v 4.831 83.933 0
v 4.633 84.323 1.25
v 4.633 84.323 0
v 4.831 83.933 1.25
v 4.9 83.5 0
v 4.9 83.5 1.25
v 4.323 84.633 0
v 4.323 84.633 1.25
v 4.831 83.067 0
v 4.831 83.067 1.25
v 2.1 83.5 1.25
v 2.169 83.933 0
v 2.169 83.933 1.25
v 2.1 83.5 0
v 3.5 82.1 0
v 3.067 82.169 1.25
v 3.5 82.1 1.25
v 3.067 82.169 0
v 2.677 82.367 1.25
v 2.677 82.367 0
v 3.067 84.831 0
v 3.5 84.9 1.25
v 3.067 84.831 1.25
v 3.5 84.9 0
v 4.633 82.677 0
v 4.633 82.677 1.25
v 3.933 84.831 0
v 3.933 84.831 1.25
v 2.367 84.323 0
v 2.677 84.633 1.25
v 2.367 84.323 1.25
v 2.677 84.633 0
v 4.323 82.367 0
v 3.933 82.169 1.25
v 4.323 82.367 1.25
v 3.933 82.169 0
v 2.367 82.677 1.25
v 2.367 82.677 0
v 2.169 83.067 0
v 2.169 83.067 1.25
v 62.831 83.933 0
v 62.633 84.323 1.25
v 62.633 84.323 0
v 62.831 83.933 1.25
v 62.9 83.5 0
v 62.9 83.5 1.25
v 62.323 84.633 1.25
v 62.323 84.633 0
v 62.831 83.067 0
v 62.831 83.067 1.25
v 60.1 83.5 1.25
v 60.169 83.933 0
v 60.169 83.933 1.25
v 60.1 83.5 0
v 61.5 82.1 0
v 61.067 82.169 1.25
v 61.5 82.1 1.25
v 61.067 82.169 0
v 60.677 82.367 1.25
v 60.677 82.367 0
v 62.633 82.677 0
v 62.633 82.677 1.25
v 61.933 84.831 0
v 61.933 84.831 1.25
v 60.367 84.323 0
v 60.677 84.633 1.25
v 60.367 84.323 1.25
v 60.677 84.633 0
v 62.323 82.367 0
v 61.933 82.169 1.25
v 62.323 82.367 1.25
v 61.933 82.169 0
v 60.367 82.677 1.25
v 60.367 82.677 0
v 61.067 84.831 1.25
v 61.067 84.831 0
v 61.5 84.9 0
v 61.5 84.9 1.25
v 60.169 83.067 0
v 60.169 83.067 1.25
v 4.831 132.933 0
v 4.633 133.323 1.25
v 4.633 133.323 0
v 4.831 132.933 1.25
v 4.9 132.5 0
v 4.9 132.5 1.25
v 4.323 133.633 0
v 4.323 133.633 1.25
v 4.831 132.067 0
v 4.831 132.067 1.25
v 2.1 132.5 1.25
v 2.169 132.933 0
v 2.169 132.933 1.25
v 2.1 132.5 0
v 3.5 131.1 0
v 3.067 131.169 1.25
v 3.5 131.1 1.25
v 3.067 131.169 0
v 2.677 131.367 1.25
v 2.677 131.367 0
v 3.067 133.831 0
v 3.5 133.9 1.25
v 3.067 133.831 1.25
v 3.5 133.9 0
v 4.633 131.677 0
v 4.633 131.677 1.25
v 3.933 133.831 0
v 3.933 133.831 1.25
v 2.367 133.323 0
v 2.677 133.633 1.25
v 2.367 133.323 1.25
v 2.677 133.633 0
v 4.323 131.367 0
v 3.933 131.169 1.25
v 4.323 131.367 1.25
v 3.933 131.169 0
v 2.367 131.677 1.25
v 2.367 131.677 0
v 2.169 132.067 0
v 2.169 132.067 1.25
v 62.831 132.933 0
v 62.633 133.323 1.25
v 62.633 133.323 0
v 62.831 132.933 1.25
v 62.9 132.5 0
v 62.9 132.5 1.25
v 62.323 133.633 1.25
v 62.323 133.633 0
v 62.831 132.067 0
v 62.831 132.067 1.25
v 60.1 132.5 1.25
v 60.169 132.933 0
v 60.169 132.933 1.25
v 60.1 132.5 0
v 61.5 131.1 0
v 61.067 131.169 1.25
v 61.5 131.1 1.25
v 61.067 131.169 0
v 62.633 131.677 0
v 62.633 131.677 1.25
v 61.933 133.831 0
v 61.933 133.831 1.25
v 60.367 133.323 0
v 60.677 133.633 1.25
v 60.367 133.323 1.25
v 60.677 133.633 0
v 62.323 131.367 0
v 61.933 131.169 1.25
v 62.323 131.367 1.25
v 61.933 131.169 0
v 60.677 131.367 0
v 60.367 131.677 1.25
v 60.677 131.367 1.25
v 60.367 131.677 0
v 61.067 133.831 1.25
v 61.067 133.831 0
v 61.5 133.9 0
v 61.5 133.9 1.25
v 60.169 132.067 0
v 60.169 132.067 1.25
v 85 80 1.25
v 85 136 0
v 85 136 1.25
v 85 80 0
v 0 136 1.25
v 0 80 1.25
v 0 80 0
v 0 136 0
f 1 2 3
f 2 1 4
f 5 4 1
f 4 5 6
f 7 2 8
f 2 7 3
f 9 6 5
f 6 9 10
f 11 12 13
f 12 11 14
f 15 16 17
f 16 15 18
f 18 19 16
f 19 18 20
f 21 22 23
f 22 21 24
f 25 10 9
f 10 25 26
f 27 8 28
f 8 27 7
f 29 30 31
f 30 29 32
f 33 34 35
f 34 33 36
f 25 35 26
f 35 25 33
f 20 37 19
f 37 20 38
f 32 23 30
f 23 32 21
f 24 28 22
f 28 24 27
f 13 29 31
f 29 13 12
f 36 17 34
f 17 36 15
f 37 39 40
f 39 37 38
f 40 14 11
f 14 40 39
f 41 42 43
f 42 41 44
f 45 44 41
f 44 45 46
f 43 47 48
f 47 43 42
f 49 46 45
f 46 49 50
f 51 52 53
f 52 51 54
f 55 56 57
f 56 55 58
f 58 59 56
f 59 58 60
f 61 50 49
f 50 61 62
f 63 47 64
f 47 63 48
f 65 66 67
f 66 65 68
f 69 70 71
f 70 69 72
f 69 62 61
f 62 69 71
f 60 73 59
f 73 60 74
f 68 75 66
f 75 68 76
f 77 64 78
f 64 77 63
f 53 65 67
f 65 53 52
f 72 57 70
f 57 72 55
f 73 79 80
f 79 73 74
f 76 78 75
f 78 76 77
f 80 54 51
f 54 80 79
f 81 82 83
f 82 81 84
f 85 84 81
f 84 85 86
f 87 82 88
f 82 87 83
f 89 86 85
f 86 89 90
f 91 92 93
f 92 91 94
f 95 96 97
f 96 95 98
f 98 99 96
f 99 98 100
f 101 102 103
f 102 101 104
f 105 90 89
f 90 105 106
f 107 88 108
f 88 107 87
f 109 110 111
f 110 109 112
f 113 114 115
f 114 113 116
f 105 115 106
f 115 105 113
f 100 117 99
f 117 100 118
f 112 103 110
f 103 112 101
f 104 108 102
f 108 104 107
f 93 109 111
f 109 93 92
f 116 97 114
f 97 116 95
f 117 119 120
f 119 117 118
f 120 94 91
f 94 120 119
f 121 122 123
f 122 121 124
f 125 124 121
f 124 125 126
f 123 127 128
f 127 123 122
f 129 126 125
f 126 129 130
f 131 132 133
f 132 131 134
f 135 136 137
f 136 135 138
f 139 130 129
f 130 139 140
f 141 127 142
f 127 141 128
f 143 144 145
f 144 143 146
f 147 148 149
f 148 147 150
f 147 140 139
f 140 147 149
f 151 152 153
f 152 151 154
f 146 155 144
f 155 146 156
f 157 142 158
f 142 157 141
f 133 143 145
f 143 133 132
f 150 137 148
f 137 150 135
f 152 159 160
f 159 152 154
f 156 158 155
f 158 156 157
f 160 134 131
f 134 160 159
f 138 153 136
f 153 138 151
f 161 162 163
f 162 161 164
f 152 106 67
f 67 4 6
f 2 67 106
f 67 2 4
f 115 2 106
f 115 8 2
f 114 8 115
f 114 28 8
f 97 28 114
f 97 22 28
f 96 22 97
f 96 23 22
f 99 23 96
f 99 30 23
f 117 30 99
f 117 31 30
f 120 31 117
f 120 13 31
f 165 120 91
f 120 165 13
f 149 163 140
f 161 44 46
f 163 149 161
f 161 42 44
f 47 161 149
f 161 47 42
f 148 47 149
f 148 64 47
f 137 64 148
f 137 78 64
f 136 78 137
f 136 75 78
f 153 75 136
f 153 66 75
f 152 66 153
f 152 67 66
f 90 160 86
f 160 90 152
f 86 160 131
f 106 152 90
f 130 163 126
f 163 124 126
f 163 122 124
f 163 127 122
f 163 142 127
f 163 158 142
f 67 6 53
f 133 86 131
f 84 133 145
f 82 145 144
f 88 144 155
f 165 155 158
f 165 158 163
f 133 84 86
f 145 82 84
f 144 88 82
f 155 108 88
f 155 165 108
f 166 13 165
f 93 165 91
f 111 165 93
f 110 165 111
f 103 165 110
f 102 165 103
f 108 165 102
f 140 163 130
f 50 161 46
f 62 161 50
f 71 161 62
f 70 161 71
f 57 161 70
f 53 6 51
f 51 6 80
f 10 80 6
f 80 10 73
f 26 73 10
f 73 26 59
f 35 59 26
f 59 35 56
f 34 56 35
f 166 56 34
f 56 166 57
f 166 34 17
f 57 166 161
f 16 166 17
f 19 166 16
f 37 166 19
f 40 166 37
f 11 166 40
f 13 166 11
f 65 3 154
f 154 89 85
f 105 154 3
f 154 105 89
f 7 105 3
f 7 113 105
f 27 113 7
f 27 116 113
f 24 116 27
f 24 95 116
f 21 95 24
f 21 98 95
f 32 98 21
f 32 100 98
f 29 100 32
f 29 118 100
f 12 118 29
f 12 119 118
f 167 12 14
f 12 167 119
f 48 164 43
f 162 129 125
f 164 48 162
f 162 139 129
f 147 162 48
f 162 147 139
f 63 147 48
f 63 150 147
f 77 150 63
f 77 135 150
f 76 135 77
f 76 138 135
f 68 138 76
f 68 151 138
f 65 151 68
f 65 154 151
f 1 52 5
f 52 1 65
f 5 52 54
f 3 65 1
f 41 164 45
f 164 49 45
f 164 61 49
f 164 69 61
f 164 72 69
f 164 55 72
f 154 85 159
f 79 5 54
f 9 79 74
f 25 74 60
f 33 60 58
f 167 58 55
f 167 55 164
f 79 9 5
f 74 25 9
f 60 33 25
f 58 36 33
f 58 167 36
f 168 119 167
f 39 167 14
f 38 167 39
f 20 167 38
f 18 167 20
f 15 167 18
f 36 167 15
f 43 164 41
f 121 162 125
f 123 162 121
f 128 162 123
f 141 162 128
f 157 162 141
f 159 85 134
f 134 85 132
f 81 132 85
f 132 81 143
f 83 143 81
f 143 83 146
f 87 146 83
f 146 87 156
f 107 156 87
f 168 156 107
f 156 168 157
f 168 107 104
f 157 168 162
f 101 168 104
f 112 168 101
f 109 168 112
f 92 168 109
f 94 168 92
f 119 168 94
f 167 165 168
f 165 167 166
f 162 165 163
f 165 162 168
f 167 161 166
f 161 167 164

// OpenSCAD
//Shut your Pi Hole! 
//An OpenSCAD library to assist with designing Raspberry Pi accessories

//This work is licensed under the Creative Commons Attribution-ShareAlike 4.0 International License. To view a copy of this license, visit http://creativecommons.org/licenses/by-sa/4.0/.
//© 2016 Dale Price

//Pi dimensions sourced from https://www.raspberrypi.org/documentation/hardware/raspberrypi/mechanical/
//Currently supports "1B", "1A+", "1B+", "2B", "3B", "Zero"

//get vector of [x,y] vectors of locations of mounting holes based on Pi version
function piHoleLocations (board="3B") = 
	(board=="1A+" || board=="1B+" || board=="2B" || board=="3B") ?
		[[3.5, 3.5], [61.5, 3.5], [3.5, 52.5], [61.5, 52.5]] : //pi 1B+, 2B, 3B
	(board=="Zero") ?
		[[3.5, 3.5], [61.5, 3.5], [3.5, 26.5], [61.5, 26.5]] : //pi zero
	(board=="1B") ?
		[[80, 43.5], [25, 17.5]] :
	[]; //invalid board

//get vector of [x,y,z] dimensions of board
//	dimensions are for PCB only, not ports or anything else
function piBoardDim (board="3B") =
	(board=="1B" || board=="1B+" || board=="2B" || board=="3B") ?
		[85, 56, 1.25] :
	(board=="Zero") ?
		[65, 30, 1.25] :
	(board == "1A+") ?
		[65, 56, 1.25] :
	[0,0,0];

//Mounting holes for a Raspberry Pi of the specified version
//	Parameters
//		board: the version of the raspberry pi to generate holes for
//		depth: the depth of the holes in mm
module piHoles (board, depth = 5, preview=true) {
	hd = 2.8; //radius of pi mounting holes plus a tiny bit extra to account for shrinkage when 3D printing
	hr = hd/2;

	//preview of the board itself
	if(preview==true)
		% piBoard(board);
	
	//mounting holes
	for(holePos = piHoleLocations(board)) {
		translate([holePos[0], holePos[1], -depth]) cylinder(d=hd, h=depth);
	}
}

//Preview of board dimensions for Raspberry Pi of the specified version
module piBoard (board) {
	difference() {
		cube(piBoardDim(board), center=false);
		translate([0,0,piBoardDim(board)[2] + 0.01]) piHoles(board, piBoardDim(board)[2] + 0.02, false);
	}

	//warn about possible inaccuracy of boards that don't currently have official documentation
	if(board == "1B") {
		echo("CAUTION: The mounting hole positions for the board you have selected may not be accurate because the Raspberry Pi Foundation does not currently provide official mechanical drawings for it.");
	}
}

//Snap-fit posts for mounting the Raspberry Pi
//	Parameters
//		board: version of the raspberry pi to mount
//		height: height of the top surface of the raspberry pi board off the base of the posts
//		preview: whether or not to show a preview of the board in place
module piPosts(board, height=5, preview=true) {
	piSize = piBoardDim(board);
	piHolePos = piHoleLocations(board);

	module pcbPost(height) {
		cylinder(d=2, h=height);
		cylinder(d1=5, d2=2, h=height - piSize[2] - 0.25);

		translate([0, 0.4, height]) scale([1.1, 1.1, 1]) cylinder(d=2, h=0.5);
	}
	
	for(holePos = piHolePos) {
		translate([holePos[0], holePos[1], 0]) pcbPost(height);
	}

	if(preview==true)
		% translate([0,0,height-piSize[2]]) piBoard(board);
}

color("DarkGreen", 1, $fn=20) {
	// piBoard("1B");
	// translate([100,0,0]) piBoard("1A+");
	translate([0,80,0]) piBoard("2B");
	// translate([100,80,0]) piBoard("Zero");
}
